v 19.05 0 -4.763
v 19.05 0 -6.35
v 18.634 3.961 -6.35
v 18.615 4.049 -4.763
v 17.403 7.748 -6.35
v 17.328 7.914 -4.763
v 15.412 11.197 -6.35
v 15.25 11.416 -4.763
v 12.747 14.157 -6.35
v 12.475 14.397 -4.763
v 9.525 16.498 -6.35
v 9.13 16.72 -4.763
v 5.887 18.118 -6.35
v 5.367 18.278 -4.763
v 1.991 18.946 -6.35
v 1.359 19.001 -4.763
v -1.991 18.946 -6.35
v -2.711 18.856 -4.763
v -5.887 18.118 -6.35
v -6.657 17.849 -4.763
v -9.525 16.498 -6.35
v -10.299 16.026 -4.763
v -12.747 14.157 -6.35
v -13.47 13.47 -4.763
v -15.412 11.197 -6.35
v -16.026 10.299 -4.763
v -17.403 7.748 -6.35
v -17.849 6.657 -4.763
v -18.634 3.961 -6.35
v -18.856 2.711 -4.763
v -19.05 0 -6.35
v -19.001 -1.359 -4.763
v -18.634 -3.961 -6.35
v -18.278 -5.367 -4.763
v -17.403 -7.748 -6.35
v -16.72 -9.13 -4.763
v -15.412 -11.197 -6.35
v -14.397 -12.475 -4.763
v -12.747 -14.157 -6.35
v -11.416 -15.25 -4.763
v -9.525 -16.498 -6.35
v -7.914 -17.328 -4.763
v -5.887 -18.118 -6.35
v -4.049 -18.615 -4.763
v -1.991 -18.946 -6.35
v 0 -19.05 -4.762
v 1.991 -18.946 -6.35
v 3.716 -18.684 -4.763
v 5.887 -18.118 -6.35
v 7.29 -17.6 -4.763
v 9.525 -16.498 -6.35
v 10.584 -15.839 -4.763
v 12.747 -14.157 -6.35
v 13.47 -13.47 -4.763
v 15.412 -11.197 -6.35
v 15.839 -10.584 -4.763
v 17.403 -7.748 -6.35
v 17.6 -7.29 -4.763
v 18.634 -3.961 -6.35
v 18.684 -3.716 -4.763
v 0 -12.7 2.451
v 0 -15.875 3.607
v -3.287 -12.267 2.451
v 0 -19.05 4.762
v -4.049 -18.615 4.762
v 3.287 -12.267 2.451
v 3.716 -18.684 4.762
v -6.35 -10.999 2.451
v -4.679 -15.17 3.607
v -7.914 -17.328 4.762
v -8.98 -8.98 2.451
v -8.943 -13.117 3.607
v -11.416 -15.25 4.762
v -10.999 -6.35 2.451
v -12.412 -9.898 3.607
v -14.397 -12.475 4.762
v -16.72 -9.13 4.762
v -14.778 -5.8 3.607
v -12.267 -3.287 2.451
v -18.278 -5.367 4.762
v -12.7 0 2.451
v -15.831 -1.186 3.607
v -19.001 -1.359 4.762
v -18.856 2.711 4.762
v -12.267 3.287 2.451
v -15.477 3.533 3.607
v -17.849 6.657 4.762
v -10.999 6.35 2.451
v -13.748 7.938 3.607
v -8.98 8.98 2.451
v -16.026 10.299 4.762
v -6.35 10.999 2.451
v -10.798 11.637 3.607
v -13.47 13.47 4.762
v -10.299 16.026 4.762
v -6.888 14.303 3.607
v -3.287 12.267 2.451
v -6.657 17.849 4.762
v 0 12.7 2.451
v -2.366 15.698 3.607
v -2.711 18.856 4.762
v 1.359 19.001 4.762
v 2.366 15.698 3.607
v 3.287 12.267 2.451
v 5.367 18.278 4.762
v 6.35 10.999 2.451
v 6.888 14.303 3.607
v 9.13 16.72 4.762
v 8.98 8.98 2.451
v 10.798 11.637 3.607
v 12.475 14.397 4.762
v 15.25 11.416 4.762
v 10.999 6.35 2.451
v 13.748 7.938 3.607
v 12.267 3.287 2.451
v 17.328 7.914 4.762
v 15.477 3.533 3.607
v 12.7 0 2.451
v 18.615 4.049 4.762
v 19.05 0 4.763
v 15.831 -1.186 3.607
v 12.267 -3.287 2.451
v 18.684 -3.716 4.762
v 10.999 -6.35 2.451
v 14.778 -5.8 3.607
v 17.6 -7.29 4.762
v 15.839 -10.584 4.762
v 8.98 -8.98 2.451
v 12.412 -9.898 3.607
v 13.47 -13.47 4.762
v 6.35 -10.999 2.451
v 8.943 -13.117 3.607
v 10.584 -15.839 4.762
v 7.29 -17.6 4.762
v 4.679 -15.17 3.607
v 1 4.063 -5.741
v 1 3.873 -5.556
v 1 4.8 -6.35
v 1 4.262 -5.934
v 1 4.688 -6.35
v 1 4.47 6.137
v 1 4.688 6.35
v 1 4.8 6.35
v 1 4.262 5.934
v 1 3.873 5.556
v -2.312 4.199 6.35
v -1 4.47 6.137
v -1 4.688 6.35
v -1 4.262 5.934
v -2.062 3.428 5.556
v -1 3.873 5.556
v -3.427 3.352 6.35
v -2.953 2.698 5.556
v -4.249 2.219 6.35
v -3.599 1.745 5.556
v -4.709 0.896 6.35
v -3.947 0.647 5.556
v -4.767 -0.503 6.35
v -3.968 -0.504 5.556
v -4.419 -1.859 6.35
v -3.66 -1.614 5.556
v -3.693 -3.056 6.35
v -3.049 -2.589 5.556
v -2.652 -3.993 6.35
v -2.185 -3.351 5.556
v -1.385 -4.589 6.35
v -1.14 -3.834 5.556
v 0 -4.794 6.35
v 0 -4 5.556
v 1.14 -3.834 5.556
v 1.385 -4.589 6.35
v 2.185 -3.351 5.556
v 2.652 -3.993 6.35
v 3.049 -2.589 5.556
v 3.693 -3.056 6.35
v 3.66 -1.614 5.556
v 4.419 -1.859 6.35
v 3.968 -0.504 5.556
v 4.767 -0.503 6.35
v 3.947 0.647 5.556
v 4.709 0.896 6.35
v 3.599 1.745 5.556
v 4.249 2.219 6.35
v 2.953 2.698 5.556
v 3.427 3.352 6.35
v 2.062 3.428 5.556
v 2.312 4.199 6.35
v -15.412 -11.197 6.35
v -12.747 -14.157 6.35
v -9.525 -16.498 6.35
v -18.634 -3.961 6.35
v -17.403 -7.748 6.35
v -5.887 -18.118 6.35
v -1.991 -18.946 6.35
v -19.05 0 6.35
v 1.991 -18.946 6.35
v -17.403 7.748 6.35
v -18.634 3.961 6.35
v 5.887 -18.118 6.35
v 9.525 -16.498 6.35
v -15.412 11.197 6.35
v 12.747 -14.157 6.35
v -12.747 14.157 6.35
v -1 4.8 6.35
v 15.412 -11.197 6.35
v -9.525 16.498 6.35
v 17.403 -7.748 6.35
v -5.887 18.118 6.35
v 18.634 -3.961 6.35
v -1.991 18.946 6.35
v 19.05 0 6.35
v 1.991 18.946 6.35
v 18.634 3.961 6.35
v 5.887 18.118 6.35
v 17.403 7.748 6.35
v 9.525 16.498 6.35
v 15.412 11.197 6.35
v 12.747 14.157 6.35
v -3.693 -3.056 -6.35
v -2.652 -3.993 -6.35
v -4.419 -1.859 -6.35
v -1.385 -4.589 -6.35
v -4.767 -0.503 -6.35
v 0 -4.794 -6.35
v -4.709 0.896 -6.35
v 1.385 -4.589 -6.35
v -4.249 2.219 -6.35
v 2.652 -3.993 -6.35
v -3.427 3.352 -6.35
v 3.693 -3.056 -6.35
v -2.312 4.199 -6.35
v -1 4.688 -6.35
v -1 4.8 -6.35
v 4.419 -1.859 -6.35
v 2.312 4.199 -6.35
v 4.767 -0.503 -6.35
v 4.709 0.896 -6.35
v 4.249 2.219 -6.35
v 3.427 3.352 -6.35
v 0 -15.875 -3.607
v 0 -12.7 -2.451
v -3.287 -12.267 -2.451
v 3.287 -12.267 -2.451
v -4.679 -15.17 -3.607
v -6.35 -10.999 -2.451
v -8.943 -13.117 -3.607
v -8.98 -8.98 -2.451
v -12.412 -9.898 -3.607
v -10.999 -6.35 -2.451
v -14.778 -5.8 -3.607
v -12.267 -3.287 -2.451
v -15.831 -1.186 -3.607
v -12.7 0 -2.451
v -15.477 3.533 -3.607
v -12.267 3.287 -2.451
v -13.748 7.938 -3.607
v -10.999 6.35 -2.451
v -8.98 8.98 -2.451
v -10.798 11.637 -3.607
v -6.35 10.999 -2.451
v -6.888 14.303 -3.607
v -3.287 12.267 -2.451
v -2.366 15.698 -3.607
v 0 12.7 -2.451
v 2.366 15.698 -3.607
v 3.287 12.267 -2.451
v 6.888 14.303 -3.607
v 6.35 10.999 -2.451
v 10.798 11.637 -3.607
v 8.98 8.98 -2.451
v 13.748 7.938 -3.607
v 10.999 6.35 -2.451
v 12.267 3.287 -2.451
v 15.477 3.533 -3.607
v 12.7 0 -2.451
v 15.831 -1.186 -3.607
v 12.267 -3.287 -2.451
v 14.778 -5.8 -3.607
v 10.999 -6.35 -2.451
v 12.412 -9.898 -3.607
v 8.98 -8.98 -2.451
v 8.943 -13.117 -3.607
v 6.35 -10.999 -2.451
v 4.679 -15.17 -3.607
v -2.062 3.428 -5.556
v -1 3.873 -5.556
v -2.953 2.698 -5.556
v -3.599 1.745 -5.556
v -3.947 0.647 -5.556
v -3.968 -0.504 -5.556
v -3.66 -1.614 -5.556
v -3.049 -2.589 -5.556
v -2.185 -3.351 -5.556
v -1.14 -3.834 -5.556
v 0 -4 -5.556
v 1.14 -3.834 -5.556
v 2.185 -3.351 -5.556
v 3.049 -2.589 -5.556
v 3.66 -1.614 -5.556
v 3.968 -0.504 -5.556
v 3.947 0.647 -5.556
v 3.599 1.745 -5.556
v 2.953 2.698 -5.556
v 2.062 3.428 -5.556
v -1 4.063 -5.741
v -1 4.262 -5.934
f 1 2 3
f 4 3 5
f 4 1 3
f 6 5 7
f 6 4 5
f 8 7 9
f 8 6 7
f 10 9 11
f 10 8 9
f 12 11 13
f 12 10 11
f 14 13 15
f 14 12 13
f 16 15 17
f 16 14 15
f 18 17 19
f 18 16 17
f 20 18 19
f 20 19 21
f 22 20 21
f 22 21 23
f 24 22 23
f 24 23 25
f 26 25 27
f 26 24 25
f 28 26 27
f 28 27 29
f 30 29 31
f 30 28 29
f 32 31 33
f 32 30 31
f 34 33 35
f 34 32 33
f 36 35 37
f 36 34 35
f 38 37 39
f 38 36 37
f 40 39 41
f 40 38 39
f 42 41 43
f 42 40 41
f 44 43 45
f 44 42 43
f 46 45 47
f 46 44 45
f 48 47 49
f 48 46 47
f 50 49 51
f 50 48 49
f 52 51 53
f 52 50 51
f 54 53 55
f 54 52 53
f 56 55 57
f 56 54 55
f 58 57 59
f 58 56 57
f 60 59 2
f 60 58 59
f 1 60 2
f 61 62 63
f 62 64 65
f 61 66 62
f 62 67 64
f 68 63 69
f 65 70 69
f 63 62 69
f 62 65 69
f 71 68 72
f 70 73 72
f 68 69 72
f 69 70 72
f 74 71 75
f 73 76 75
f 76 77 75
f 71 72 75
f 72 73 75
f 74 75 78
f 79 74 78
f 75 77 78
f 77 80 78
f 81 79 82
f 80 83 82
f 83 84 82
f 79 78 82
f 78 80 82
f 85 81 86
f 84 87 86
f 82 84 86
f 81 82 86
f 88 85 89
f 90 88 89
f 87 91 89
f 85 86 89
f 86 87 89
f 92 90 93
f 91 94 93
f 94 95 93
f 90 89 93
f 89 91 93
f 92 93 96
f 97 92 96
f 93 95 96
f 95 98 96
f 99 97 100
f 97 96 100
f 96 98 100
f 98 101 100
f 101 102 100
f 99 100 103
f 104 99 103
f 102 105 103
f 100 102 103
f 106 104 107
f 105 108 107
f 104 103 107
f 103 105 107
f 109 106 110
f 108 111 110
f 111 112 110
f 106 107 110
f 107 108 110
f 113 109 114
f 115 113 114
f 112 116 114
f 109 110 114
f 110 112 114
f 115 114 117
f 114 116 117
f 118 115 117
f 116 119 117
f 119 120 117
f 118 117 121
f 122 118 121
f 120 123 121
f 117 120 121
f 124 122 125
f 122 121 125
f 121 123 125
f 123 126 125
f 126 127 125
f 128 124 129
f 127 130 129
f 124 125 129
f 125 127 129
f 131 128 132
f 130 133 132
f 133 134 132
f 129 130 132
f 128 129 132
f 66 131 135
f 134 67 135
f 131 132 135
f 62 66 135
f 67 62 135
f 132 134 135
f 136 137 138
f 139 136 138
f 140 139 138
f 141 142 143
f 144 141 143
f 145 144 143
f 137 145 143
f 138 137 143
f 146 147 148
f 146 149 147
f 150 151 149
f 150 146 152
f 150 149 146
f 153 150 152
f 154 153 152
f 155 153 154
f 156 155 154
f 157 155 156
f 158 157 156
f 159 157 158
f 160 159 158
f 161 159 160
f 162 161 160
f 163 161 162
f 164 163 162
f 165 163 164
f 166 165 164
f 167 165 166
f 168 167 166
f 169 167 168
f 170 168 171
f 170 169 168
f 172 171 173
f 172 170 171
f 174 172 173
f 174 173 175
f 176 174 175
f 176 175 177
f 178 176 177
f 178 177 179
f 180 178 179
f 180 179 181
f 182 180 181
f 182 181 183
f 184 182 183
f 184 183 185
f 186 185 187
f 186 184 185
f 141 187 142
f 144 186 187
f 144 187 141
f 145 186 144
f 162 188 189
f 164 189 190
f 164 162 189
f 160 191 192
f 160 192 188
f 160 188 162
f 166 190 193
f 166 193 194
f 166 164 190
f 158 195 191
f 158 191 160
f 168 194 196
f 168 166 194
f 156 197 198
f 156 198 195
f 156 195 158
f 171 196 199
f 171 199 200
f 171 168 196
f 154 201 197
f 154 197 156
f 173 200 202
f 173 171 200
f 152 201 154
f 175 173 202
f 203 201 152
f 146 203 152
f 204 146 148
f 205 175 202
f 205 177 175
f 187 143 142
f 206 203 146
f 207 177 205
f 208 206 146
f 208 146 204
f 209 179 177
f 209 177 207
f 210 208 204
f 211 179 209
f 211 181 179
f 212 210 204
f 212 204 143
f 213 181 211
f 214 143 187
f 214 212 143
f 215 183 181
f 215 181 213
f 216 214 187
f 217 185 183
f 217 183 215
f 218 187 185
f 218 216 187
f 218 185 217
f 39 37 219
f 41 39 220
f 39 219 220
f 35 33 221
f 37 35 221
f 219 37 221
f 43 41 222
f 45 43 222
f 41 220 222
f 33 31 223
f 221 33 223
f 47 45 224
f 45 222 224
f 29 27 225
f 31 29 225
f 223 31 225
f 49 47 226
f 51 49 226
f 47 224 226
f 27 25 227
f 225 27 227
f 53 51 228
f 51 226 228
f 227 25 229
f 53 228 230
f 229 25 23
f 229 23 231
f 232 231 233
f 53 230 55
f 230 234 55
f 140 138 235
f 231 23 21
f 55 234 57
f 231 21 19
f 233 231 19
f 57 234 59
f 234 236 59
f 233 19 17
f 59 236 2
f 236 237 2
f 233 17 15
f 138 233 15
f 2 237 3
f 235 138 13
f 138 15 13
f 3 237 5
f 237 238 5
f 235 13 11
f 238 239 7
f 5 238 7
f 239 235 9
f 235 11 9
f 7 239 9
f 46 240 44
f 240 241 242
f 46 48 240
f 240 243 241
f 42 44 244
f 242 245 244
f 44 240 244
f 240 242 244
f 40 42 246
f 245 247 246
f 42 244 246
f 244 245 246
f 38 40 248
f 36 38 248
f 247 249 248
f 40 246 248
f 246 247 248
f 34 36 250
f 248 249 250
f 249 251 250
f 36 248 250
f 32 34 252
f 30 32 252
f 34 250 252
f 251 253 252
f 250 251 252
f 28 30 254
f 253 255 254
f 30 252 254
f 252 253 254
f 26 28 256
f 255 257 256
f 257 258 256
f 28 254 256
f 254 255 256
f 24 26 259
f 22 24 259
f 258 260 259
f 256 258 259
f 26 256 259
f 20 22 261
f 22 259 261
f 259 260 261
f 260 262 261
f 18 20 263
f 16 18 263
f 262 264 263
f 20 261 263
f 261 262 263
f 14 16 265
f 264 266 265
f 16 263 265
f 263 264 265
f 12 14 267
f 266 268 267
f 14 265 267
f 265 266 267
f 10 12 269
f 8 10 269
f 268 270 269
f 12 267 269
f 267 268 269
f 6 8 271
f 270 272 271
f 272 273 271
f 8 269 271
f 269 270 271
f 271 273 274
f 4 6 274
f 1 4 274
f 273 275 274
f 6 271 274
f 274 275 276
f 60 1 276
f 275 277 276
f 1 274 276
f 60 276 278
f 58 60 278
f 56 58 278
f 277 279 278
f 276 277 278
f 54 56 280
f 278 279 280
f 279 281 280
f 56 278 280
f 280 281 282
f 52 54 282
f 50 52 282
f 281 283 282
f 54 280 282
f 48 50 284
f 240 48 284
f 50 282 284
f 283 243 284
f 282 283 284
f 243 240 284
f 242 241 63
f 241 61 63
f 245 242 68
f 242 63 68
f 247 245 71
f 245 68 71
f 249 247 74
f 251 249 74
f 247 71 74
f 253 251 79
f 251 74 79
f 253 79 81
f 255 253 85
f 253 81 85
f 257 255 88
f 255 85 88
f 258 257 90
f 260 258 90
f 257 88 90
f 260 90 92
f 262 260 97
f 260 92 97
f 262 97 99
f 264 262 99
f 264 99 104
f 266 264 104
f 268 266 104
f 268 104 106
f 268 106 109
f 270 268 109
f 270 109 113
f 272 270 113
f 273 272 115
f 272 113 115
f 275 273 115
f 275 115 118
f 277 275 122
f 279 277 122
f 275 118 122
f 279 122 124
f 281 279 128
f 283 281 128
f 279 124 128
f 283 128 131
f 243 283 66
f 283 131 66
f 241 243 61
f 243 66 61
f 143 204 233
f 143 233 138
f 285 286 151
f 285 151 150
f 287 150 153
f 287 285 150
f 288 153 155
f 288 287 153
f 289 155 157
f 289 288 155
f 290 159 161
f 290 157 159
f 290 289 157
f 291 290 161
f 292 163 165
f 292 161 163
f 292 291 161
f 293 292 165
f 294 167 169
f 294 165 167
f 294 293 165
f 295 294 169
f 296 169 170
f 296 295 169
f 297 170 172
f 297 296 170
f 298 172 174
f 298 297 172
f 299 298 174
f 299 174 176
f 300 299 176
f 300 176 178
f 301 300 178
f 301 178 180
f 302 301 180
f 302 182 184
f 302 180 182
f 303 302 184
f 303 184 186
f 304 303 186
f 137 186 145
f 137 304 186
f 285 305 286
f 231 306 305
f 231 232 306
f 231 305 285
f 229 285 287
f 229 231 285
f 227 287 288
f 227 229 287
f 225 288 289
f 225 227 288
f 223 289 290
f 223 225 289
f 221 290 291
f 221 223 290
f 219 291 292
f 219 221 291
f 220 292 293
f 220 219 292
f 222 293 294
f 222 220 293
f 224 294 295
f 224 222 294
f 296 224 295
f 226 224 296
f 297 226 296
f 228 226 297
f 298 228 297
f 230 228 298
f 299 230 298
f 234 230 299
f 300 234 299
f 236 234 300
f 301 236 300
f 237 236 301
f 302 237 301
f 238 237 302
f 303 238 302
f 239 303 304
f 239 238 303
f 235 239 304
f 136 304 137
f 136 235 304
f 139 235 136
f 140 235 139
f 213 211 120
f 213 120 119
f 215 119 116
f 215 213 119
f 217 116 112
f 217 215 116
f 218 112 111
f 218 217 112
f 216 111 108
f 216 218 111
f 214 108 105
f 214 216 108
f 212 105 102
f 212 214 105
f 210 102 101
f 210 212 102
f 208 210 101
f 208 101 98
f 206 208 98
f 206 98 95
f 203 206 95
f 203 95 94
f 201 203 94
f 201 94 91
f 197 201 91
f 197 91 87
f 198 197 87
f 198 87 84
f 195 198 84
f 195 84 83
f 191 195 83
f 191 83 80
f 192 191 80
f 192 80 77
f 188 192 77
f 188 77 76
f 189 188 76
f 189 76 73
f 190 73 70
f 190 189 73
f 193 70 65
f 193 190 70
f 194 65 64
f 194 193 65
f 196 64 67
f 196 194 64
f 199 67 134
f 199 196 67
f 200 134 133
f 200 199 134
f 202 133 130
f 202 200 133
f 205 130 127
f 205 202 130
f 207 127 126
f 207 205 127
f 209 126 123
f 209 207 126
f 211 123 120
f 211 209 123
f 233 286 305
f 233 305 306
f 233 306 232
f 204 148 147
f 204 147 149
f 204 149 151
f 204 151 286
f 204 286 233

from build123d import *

# Parameters (mm, degrees)
SKETCH1_R          = 19.05
SKETCH1_R_2        = 4
EXTRUDE1_DEPTH     = 6.35
CHAMFER1_SIZE      = 0.79375
SKETCH3_W          = 2
SKETCH3_H          = 2
CUT_EXTRUDE1_DEPTH = 30.784140075


with BuildPart() as part:
    # Sketch1 → Extrude1 (new, symmetric)
    with BuildSketch(Plane.XY):
        Circle(SKETCH1_R)
        Circle(SKETCH1_R_2, mode=Mode.SUBTRACT)
    extrude(amount=EXTRUDE1_DEPTH, both=True)

    # Chamfer1
    chamfer1_edges = [part.edges().sort_by_distance(p)[0] for p in [
        (-4, 0, -6.35),
        (-4, 0, 6.35),
    ]]
    chamfer(chamfer1_edges, length=CHAMFER1_SIZE)

    # Sketch2 → Cut-Revolve1 (revolve, cut)
    with BuildSketch(Plane(origin=(0, 0, 0), x_dir=(0, 0, -1), z_dir=(1, 0, 0)), mode=Mode.PRIVATE) as cut_revolve1_sk:
        Polygon((-4.7625, 19.05), (4.7625, 19.05), (2.451289012, 12.7), (-2.451289012, 12.7), align=None)
    revolve(cut_revolve1_sk.sketch.rotate(Axis((0, 0, 6.35), (0, 0, -1)), 180), axis=Axis((0, 0, 6.35), (0, 0, -1)), mode=Mode.SUBTRACT)

    # Sketch3 → Cut-Extrude1 (cut, through all)
    with BuildSketch(Plane.XY.offset(6.35)):
        with Locations((0, 3.8)):
            Rectangle(SKETCH3_W, SKETCH3_H)
    extrude(amount=-CUT_EXTRUDE1_DEPTH, mode=Mode.SUBTRACT)


solid = part.part
